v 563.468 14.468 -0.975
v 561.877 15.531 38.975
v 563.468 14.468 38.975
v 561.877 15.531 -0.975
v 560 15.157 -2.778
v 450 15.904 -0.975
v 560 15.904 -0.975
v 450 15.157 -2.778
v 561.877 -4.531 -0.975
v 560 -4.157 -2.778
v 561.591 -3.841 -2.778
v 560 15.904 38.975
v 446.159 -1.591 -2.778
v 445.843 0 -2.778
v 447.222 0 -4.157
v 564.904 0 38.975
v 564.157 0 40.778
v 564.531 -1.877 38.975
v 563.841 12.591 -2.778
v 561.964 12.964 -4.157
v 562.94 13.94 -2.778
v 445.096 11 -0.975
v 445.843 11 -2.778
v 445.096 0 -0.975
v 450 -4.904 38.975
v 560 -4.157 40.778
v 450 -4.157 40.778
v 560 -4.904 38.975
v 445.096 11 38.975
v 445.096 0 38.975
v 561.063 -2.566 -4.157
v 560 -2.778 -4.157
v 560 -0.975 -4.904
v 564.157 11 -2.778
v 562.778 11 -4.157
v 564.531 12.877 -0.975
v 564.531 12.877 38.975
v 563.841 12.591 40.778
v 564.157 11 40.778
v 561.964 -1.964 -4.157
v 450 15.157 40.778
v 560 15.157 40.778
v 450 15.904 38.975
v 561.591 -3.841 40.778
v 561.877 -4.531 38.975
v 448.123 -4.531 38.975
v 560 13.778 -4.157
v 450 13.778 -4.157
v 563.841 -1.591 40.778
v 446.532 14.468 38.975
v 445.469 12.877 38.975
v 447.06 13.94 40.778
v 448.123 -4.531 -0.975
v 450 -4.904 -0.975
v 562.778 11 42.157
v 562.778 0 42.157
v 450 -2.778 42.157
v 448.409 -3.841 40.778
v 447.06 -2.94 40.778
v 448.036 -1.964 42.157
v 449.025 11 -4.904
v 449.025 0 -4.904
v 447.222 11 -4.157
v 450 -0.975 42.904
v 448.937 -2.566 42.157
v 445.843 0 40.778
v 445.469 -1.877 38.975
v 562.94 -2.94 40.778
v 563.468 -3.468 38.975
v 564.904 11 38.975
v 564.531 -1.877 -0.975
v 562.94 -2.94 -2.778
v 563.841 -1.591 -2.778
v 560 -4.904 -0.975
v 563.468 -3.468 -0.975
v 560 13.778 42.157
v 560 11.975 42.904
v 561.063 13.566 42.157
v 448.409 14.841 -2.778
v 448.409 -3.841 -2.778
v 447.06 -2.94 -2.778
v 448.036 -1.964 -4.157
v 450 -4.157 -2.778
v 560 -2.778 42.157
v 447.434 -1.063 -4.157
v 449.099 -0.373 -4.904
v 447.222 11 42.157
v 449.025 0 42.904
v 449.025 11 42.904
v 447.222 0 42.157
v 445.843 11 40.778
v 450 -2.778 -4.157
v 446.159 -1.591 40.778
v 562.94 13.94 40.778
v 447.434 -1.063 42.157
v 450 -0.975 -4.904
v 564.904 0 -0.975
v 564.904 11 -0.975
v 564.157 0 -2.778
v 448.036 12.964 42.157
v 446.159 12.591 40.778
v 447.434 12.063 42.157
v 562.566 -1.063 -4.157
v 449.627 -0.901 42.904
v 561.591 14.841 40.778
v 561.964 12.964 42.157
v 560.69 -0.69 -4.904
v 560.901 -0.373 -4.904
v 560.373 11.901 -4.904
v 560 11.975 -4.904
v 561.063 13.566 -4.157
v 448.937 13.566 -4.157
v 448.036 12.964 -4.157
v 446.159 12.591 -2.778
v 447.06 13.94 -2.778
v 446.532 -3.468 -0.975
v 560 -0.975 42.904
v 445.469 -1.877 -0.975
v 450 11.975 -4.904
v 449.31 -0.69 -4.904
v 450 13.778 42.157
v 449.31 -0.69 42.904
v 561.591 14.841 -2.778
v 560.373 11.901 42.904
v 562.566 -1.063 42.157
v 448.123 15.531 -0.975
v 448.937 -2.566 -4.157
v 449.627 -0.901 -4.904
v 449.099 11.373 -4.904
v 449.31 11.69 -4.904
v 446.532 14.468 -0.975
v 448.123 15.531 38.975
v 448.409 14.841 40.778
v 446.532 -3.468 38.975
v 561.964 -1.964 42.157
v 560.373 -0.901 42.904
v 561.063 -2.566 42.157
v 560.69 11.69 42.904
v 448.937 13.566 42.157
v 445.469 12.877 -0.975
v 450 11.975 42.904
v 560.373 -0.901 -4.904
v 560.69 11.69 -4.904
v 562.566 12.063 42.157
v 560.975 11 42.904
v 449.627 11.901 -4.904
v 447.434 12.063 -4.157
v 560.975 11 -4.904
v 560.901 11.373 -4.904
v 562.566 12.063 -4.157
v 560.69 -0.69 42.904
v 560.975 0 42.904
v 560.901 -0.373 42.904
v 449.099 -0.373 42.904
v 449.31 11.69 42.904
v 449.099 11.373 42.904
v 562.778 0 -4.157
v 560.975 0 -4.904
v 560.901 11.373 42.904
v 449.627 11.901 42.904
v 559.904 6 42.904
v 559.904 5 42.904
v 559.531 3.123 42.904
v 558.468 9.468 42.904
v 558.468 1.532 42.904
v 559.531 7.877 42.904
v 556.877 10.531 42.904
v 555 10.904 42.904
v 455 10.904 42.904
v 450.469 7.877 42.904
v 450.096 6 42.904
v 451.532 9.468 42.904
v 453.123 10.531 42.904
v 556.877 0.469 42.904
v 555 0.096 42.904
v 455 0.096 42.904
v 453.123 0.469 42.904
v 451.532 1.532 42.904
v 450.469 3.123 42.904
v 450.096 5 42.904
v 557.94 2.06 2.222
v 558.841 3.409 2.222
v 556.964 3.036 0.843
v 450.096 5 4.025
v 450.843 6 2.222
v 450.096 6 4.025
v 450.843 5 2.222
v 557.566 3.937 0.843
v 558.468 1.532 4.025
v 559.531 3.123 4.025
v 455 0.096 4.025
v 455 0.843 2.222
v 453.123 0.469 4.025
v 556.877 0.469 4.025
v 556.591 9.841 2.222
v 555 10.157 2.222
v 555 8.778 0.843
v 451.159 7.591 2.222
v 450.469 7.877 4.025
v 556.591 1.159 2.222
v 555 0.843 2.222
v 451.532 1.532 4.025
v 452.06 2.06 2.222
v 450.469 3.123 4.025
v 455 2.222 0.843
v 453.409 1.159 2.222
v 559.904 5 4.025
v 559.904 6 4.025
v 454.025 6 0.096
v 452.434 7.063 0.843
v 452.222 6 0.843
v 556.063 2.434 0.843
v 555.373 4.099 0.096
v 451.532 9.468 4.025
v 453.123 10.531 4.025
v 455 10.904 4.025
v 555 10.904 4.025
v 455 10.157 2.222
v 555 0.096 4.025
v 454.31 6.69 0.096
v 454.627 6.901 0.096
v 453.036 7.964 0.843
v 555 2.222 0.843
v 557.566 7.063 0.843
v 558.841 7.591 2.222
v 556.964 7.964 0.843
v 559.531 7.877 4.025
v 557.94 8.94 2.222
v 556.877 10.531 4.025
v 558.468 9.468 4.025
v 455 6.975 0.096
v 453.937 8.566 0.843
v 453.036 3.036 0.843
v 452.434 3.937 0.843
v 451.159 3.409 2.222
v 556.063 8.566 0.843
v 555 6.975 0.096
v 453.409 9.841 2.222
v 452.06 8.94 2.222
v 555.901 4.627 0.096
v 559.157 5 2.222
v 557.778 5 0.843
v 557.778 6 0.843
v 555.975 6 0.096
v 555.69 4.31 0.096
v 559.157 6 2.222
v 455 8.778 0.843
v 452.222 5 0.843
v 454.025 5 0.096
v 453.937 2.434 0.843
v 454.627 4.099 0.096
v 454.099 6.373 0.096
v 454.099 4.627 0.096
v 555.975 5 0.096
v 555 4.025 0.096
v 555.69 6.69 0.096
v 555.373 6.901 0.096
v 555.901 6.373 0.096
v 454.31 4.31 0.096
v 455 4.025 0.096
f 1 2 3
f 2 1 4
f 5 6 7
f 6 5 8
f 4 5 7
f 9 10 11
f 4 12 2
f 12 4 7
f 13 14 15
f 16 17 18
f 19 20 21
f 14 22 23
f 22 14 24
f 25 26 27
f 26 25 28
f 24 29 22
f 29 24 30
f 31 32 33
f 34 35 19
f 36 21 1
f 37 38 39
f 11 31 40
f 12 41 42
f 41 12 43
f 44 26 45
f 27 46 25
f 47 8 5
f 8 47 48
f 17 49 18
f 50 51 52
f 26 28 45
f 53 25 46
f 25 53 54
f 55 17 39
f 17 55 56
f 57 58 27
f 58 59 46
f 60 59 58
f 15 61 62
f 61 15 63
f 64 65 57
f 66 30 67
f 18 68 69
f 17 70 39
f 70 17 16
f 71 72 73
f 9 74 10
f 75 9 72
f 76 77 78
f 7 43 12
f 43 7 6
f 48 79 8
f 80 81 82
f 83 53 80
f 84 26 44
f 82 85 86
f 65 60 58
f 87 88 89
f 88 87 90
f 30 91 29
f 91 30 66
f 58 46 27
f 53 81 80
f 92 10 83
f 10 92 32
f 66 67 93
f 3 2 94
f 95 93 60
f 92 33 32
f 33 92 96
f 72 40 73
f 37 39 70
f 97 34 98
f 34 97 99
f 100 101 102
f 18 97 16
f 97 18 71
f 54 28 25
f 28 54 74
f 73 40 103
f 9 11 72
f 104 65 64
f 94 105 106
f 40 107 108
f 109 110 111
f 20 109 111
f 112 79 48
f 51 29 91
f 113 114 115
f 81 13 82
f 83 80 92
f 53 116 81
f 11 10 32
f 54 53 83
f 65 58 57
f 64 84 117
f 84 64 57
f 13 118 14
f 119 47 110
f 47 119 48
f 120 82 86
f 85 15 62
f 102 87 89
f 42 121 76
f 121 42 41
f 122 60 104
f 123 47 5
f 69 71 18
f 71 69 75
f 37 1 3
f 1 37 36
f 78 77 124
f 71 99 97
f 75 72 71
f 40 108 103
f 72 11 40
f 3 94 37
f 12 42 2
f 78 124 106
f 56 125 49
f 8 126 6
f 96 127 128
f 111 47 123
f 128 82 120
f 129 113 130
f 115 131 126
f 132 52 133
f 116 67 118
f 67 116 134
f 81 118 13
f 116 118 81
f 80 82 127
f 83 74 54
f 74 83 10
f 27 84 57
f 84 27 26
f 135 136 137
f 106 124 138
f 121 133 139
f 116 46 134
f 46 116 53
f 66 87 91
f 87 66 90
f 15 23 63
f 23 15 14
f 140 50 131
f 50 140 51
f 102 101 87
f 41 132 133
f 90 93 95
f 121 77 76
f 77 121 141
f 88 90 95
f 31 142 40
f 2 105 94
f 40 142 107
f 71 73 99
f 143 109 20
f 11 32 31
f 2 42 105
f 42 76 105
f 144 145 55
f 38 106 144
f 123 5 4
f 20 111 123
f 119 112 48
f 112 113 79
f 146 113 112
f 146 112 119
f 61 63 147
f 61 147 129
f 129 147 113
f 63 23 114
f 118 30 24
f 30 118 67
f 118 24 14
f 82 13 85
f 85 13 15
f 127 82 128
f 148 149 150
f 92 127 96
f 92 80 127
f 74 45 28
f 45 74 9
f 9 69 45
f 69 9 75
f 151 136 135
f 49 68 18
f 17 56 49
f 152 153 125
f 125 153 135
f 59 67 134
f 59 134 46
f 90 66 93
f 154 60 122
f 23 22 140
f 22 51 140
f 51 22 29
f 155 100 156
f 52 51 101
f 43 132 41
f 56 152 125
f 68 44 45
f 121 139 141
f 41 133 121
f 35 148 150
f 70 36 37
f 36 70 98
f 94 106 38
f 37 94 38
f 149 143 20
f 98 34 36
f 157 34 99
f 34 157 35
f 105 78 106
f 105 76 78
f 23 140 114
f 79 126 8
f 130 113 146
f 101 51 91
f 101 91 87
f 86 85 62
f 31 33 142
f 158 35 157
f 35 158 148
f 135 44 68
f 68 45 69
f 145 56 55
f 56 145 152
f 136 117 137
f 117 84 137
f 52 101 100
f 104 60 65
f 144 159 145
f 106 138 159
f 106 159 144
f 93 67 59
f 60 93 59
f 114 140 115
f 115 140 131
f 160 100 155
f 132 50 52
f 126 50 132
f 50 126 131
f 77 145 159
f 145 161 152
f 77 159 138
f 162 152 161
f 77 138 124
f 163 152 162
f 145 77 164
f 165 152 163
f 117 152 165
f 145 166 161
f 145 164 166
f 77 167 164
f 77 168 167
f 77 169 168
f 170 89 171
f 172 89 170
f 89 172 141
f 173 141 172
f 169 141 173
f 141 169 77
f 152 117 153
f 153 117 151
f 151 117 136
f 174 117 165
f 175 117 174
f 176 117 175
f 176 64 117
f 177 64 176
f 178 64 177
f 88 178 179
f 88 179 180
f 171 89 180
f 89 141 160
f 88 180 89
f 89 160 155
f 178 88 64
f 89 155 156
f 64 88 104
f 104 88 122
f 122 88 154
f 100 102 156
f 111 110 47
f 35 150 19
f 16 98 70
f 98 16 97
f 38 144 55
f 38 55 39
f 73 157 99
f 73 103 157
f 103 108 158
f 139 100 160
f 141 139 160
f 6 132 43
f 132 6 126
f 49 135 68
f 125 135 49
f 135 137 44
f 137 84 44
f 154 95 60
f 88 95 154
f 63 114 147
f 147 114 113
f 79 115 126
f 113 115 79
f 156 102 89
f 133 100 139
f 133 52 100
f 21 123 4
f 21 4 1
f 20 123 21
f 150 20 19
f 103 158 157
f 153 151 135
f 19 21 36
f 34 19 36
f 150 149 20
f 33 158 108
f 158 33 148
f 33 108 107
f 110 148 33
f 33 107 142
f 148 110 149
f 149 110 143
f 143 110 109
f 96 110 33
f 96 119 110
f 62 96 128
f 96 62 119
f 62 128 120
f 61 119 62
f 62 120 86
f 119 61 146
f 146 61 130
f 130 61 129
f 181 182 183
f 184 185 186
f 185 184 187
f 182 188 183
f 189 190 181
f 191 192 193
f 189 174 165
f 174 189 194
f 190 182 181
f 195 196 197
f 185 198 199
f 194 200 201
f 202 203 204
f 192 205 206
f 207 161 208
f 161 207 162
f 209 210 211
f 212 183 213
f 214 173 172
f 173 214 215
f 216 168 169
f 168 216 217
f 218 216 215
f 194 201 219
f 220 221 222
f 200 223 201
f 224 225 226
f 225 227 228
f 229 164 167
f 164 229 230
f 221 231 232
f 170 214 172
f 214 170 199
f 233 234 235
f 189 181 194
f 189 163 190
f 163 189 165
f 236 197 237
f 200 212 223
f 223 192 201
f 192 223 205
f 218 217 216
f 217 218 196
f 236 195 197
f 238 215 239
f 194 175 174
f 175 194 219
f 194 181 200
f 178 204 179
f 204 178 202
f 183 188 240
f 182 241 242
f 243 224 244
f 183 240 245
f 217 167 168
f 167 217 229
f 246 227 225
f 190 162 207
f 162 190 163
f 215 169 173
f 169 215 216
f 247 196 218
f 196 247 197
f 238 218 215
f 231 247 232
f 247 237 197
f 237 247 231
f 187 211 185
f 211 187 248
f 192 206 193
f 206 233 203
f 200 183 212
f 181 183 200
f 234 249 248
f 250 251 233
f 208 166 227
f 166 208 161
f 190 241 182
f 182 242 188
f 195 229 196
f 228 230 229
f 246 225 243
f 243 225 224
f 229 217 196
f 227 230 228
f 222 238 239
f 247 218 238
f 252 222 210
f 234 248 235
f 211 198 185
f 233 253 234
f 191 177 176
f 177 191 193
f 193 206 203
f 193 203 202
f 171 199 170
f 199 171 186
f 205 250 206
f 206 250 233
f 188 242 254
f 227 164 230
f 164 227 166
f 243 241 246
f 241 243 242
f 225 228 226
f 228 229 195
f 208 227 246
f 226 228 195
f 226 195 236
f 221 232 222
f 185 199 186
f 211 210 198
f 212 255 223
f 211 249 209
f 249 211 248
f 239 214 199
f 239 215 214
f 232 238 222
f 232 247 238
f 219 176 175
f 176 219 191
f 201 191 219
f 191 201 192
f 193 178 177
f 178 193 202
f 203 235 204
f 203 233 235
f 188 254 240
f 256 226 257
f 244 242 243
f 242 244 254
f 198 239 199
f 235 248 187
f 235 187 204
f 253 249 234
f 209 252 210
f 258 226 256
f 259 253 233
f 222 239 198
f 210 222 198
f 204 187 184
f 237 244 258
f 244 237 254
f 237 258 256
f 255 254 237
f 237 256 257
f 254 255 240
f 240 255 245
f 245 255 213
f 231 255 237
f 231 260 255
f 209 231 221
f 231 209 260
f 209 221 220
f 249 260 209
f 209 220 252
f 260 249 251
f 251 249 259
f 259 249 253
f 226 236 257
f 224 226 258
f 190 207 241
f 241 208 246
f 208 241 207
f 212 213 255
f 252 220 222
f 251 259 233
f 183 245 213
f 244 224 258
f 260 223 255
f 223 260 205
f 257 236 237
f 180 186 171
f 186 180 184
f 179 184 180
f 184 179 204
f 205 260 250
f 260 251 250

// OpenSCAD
/*
box_generator

Description:
*****************
A module for generating boxes with rounded edges inside.
Boxes are meant for appartment enterance closet

Creator:
*****************
Constantin Ganshin
*/

wall = 0;
r_inside = 5;
r_outside = 5;

module box_generator(x,y,z) {
  difference() {
    minkowski() {
      cube([x,y,z]);
      sphere(r_outside);
    }
    translate([wall + r_inside, wall + r_inside, wall + r_inside])
      minkowski() {
        cube([x - 2*r_inside -(wall*2),y - 2*r_inside -(wall*2),z + 2]);
        sphere(r_inside);
      }
  }
}

module box_generator_without_wall(x,y,z) {
  difference() {
    minkowski() {
      cube([x,y,z]);
      sphere(r_outside);
    }
    translate([wall + r_inside, wall + r_inside, wall + r_inside])
      minkowski() {
        cube([x - 2*r_inside -(wall*2),y + 2*r_inside + (wall*2),z + 2]);
        sphere(r_inside);
      }
  }
}

// Special measuring module
module measure(x) {
  color("#FF0000") //red color for easier visibility
    cube([x,5,5]);
}

box_generator(70,130,120);

translate([90,0,0])
  box_generator(80,130,100);

translate([190,0,0])
  box_generator(160,170,60);

translate([370,0,0])
  box_generator_without_wall(60,260,180);

!translate([450,0,0])
  box_generator(110,11,38);  // For small wallet that will be inside of the big box

translate([450, 0, 40])
  rotate([0, 0, 0])
    measure(100);
